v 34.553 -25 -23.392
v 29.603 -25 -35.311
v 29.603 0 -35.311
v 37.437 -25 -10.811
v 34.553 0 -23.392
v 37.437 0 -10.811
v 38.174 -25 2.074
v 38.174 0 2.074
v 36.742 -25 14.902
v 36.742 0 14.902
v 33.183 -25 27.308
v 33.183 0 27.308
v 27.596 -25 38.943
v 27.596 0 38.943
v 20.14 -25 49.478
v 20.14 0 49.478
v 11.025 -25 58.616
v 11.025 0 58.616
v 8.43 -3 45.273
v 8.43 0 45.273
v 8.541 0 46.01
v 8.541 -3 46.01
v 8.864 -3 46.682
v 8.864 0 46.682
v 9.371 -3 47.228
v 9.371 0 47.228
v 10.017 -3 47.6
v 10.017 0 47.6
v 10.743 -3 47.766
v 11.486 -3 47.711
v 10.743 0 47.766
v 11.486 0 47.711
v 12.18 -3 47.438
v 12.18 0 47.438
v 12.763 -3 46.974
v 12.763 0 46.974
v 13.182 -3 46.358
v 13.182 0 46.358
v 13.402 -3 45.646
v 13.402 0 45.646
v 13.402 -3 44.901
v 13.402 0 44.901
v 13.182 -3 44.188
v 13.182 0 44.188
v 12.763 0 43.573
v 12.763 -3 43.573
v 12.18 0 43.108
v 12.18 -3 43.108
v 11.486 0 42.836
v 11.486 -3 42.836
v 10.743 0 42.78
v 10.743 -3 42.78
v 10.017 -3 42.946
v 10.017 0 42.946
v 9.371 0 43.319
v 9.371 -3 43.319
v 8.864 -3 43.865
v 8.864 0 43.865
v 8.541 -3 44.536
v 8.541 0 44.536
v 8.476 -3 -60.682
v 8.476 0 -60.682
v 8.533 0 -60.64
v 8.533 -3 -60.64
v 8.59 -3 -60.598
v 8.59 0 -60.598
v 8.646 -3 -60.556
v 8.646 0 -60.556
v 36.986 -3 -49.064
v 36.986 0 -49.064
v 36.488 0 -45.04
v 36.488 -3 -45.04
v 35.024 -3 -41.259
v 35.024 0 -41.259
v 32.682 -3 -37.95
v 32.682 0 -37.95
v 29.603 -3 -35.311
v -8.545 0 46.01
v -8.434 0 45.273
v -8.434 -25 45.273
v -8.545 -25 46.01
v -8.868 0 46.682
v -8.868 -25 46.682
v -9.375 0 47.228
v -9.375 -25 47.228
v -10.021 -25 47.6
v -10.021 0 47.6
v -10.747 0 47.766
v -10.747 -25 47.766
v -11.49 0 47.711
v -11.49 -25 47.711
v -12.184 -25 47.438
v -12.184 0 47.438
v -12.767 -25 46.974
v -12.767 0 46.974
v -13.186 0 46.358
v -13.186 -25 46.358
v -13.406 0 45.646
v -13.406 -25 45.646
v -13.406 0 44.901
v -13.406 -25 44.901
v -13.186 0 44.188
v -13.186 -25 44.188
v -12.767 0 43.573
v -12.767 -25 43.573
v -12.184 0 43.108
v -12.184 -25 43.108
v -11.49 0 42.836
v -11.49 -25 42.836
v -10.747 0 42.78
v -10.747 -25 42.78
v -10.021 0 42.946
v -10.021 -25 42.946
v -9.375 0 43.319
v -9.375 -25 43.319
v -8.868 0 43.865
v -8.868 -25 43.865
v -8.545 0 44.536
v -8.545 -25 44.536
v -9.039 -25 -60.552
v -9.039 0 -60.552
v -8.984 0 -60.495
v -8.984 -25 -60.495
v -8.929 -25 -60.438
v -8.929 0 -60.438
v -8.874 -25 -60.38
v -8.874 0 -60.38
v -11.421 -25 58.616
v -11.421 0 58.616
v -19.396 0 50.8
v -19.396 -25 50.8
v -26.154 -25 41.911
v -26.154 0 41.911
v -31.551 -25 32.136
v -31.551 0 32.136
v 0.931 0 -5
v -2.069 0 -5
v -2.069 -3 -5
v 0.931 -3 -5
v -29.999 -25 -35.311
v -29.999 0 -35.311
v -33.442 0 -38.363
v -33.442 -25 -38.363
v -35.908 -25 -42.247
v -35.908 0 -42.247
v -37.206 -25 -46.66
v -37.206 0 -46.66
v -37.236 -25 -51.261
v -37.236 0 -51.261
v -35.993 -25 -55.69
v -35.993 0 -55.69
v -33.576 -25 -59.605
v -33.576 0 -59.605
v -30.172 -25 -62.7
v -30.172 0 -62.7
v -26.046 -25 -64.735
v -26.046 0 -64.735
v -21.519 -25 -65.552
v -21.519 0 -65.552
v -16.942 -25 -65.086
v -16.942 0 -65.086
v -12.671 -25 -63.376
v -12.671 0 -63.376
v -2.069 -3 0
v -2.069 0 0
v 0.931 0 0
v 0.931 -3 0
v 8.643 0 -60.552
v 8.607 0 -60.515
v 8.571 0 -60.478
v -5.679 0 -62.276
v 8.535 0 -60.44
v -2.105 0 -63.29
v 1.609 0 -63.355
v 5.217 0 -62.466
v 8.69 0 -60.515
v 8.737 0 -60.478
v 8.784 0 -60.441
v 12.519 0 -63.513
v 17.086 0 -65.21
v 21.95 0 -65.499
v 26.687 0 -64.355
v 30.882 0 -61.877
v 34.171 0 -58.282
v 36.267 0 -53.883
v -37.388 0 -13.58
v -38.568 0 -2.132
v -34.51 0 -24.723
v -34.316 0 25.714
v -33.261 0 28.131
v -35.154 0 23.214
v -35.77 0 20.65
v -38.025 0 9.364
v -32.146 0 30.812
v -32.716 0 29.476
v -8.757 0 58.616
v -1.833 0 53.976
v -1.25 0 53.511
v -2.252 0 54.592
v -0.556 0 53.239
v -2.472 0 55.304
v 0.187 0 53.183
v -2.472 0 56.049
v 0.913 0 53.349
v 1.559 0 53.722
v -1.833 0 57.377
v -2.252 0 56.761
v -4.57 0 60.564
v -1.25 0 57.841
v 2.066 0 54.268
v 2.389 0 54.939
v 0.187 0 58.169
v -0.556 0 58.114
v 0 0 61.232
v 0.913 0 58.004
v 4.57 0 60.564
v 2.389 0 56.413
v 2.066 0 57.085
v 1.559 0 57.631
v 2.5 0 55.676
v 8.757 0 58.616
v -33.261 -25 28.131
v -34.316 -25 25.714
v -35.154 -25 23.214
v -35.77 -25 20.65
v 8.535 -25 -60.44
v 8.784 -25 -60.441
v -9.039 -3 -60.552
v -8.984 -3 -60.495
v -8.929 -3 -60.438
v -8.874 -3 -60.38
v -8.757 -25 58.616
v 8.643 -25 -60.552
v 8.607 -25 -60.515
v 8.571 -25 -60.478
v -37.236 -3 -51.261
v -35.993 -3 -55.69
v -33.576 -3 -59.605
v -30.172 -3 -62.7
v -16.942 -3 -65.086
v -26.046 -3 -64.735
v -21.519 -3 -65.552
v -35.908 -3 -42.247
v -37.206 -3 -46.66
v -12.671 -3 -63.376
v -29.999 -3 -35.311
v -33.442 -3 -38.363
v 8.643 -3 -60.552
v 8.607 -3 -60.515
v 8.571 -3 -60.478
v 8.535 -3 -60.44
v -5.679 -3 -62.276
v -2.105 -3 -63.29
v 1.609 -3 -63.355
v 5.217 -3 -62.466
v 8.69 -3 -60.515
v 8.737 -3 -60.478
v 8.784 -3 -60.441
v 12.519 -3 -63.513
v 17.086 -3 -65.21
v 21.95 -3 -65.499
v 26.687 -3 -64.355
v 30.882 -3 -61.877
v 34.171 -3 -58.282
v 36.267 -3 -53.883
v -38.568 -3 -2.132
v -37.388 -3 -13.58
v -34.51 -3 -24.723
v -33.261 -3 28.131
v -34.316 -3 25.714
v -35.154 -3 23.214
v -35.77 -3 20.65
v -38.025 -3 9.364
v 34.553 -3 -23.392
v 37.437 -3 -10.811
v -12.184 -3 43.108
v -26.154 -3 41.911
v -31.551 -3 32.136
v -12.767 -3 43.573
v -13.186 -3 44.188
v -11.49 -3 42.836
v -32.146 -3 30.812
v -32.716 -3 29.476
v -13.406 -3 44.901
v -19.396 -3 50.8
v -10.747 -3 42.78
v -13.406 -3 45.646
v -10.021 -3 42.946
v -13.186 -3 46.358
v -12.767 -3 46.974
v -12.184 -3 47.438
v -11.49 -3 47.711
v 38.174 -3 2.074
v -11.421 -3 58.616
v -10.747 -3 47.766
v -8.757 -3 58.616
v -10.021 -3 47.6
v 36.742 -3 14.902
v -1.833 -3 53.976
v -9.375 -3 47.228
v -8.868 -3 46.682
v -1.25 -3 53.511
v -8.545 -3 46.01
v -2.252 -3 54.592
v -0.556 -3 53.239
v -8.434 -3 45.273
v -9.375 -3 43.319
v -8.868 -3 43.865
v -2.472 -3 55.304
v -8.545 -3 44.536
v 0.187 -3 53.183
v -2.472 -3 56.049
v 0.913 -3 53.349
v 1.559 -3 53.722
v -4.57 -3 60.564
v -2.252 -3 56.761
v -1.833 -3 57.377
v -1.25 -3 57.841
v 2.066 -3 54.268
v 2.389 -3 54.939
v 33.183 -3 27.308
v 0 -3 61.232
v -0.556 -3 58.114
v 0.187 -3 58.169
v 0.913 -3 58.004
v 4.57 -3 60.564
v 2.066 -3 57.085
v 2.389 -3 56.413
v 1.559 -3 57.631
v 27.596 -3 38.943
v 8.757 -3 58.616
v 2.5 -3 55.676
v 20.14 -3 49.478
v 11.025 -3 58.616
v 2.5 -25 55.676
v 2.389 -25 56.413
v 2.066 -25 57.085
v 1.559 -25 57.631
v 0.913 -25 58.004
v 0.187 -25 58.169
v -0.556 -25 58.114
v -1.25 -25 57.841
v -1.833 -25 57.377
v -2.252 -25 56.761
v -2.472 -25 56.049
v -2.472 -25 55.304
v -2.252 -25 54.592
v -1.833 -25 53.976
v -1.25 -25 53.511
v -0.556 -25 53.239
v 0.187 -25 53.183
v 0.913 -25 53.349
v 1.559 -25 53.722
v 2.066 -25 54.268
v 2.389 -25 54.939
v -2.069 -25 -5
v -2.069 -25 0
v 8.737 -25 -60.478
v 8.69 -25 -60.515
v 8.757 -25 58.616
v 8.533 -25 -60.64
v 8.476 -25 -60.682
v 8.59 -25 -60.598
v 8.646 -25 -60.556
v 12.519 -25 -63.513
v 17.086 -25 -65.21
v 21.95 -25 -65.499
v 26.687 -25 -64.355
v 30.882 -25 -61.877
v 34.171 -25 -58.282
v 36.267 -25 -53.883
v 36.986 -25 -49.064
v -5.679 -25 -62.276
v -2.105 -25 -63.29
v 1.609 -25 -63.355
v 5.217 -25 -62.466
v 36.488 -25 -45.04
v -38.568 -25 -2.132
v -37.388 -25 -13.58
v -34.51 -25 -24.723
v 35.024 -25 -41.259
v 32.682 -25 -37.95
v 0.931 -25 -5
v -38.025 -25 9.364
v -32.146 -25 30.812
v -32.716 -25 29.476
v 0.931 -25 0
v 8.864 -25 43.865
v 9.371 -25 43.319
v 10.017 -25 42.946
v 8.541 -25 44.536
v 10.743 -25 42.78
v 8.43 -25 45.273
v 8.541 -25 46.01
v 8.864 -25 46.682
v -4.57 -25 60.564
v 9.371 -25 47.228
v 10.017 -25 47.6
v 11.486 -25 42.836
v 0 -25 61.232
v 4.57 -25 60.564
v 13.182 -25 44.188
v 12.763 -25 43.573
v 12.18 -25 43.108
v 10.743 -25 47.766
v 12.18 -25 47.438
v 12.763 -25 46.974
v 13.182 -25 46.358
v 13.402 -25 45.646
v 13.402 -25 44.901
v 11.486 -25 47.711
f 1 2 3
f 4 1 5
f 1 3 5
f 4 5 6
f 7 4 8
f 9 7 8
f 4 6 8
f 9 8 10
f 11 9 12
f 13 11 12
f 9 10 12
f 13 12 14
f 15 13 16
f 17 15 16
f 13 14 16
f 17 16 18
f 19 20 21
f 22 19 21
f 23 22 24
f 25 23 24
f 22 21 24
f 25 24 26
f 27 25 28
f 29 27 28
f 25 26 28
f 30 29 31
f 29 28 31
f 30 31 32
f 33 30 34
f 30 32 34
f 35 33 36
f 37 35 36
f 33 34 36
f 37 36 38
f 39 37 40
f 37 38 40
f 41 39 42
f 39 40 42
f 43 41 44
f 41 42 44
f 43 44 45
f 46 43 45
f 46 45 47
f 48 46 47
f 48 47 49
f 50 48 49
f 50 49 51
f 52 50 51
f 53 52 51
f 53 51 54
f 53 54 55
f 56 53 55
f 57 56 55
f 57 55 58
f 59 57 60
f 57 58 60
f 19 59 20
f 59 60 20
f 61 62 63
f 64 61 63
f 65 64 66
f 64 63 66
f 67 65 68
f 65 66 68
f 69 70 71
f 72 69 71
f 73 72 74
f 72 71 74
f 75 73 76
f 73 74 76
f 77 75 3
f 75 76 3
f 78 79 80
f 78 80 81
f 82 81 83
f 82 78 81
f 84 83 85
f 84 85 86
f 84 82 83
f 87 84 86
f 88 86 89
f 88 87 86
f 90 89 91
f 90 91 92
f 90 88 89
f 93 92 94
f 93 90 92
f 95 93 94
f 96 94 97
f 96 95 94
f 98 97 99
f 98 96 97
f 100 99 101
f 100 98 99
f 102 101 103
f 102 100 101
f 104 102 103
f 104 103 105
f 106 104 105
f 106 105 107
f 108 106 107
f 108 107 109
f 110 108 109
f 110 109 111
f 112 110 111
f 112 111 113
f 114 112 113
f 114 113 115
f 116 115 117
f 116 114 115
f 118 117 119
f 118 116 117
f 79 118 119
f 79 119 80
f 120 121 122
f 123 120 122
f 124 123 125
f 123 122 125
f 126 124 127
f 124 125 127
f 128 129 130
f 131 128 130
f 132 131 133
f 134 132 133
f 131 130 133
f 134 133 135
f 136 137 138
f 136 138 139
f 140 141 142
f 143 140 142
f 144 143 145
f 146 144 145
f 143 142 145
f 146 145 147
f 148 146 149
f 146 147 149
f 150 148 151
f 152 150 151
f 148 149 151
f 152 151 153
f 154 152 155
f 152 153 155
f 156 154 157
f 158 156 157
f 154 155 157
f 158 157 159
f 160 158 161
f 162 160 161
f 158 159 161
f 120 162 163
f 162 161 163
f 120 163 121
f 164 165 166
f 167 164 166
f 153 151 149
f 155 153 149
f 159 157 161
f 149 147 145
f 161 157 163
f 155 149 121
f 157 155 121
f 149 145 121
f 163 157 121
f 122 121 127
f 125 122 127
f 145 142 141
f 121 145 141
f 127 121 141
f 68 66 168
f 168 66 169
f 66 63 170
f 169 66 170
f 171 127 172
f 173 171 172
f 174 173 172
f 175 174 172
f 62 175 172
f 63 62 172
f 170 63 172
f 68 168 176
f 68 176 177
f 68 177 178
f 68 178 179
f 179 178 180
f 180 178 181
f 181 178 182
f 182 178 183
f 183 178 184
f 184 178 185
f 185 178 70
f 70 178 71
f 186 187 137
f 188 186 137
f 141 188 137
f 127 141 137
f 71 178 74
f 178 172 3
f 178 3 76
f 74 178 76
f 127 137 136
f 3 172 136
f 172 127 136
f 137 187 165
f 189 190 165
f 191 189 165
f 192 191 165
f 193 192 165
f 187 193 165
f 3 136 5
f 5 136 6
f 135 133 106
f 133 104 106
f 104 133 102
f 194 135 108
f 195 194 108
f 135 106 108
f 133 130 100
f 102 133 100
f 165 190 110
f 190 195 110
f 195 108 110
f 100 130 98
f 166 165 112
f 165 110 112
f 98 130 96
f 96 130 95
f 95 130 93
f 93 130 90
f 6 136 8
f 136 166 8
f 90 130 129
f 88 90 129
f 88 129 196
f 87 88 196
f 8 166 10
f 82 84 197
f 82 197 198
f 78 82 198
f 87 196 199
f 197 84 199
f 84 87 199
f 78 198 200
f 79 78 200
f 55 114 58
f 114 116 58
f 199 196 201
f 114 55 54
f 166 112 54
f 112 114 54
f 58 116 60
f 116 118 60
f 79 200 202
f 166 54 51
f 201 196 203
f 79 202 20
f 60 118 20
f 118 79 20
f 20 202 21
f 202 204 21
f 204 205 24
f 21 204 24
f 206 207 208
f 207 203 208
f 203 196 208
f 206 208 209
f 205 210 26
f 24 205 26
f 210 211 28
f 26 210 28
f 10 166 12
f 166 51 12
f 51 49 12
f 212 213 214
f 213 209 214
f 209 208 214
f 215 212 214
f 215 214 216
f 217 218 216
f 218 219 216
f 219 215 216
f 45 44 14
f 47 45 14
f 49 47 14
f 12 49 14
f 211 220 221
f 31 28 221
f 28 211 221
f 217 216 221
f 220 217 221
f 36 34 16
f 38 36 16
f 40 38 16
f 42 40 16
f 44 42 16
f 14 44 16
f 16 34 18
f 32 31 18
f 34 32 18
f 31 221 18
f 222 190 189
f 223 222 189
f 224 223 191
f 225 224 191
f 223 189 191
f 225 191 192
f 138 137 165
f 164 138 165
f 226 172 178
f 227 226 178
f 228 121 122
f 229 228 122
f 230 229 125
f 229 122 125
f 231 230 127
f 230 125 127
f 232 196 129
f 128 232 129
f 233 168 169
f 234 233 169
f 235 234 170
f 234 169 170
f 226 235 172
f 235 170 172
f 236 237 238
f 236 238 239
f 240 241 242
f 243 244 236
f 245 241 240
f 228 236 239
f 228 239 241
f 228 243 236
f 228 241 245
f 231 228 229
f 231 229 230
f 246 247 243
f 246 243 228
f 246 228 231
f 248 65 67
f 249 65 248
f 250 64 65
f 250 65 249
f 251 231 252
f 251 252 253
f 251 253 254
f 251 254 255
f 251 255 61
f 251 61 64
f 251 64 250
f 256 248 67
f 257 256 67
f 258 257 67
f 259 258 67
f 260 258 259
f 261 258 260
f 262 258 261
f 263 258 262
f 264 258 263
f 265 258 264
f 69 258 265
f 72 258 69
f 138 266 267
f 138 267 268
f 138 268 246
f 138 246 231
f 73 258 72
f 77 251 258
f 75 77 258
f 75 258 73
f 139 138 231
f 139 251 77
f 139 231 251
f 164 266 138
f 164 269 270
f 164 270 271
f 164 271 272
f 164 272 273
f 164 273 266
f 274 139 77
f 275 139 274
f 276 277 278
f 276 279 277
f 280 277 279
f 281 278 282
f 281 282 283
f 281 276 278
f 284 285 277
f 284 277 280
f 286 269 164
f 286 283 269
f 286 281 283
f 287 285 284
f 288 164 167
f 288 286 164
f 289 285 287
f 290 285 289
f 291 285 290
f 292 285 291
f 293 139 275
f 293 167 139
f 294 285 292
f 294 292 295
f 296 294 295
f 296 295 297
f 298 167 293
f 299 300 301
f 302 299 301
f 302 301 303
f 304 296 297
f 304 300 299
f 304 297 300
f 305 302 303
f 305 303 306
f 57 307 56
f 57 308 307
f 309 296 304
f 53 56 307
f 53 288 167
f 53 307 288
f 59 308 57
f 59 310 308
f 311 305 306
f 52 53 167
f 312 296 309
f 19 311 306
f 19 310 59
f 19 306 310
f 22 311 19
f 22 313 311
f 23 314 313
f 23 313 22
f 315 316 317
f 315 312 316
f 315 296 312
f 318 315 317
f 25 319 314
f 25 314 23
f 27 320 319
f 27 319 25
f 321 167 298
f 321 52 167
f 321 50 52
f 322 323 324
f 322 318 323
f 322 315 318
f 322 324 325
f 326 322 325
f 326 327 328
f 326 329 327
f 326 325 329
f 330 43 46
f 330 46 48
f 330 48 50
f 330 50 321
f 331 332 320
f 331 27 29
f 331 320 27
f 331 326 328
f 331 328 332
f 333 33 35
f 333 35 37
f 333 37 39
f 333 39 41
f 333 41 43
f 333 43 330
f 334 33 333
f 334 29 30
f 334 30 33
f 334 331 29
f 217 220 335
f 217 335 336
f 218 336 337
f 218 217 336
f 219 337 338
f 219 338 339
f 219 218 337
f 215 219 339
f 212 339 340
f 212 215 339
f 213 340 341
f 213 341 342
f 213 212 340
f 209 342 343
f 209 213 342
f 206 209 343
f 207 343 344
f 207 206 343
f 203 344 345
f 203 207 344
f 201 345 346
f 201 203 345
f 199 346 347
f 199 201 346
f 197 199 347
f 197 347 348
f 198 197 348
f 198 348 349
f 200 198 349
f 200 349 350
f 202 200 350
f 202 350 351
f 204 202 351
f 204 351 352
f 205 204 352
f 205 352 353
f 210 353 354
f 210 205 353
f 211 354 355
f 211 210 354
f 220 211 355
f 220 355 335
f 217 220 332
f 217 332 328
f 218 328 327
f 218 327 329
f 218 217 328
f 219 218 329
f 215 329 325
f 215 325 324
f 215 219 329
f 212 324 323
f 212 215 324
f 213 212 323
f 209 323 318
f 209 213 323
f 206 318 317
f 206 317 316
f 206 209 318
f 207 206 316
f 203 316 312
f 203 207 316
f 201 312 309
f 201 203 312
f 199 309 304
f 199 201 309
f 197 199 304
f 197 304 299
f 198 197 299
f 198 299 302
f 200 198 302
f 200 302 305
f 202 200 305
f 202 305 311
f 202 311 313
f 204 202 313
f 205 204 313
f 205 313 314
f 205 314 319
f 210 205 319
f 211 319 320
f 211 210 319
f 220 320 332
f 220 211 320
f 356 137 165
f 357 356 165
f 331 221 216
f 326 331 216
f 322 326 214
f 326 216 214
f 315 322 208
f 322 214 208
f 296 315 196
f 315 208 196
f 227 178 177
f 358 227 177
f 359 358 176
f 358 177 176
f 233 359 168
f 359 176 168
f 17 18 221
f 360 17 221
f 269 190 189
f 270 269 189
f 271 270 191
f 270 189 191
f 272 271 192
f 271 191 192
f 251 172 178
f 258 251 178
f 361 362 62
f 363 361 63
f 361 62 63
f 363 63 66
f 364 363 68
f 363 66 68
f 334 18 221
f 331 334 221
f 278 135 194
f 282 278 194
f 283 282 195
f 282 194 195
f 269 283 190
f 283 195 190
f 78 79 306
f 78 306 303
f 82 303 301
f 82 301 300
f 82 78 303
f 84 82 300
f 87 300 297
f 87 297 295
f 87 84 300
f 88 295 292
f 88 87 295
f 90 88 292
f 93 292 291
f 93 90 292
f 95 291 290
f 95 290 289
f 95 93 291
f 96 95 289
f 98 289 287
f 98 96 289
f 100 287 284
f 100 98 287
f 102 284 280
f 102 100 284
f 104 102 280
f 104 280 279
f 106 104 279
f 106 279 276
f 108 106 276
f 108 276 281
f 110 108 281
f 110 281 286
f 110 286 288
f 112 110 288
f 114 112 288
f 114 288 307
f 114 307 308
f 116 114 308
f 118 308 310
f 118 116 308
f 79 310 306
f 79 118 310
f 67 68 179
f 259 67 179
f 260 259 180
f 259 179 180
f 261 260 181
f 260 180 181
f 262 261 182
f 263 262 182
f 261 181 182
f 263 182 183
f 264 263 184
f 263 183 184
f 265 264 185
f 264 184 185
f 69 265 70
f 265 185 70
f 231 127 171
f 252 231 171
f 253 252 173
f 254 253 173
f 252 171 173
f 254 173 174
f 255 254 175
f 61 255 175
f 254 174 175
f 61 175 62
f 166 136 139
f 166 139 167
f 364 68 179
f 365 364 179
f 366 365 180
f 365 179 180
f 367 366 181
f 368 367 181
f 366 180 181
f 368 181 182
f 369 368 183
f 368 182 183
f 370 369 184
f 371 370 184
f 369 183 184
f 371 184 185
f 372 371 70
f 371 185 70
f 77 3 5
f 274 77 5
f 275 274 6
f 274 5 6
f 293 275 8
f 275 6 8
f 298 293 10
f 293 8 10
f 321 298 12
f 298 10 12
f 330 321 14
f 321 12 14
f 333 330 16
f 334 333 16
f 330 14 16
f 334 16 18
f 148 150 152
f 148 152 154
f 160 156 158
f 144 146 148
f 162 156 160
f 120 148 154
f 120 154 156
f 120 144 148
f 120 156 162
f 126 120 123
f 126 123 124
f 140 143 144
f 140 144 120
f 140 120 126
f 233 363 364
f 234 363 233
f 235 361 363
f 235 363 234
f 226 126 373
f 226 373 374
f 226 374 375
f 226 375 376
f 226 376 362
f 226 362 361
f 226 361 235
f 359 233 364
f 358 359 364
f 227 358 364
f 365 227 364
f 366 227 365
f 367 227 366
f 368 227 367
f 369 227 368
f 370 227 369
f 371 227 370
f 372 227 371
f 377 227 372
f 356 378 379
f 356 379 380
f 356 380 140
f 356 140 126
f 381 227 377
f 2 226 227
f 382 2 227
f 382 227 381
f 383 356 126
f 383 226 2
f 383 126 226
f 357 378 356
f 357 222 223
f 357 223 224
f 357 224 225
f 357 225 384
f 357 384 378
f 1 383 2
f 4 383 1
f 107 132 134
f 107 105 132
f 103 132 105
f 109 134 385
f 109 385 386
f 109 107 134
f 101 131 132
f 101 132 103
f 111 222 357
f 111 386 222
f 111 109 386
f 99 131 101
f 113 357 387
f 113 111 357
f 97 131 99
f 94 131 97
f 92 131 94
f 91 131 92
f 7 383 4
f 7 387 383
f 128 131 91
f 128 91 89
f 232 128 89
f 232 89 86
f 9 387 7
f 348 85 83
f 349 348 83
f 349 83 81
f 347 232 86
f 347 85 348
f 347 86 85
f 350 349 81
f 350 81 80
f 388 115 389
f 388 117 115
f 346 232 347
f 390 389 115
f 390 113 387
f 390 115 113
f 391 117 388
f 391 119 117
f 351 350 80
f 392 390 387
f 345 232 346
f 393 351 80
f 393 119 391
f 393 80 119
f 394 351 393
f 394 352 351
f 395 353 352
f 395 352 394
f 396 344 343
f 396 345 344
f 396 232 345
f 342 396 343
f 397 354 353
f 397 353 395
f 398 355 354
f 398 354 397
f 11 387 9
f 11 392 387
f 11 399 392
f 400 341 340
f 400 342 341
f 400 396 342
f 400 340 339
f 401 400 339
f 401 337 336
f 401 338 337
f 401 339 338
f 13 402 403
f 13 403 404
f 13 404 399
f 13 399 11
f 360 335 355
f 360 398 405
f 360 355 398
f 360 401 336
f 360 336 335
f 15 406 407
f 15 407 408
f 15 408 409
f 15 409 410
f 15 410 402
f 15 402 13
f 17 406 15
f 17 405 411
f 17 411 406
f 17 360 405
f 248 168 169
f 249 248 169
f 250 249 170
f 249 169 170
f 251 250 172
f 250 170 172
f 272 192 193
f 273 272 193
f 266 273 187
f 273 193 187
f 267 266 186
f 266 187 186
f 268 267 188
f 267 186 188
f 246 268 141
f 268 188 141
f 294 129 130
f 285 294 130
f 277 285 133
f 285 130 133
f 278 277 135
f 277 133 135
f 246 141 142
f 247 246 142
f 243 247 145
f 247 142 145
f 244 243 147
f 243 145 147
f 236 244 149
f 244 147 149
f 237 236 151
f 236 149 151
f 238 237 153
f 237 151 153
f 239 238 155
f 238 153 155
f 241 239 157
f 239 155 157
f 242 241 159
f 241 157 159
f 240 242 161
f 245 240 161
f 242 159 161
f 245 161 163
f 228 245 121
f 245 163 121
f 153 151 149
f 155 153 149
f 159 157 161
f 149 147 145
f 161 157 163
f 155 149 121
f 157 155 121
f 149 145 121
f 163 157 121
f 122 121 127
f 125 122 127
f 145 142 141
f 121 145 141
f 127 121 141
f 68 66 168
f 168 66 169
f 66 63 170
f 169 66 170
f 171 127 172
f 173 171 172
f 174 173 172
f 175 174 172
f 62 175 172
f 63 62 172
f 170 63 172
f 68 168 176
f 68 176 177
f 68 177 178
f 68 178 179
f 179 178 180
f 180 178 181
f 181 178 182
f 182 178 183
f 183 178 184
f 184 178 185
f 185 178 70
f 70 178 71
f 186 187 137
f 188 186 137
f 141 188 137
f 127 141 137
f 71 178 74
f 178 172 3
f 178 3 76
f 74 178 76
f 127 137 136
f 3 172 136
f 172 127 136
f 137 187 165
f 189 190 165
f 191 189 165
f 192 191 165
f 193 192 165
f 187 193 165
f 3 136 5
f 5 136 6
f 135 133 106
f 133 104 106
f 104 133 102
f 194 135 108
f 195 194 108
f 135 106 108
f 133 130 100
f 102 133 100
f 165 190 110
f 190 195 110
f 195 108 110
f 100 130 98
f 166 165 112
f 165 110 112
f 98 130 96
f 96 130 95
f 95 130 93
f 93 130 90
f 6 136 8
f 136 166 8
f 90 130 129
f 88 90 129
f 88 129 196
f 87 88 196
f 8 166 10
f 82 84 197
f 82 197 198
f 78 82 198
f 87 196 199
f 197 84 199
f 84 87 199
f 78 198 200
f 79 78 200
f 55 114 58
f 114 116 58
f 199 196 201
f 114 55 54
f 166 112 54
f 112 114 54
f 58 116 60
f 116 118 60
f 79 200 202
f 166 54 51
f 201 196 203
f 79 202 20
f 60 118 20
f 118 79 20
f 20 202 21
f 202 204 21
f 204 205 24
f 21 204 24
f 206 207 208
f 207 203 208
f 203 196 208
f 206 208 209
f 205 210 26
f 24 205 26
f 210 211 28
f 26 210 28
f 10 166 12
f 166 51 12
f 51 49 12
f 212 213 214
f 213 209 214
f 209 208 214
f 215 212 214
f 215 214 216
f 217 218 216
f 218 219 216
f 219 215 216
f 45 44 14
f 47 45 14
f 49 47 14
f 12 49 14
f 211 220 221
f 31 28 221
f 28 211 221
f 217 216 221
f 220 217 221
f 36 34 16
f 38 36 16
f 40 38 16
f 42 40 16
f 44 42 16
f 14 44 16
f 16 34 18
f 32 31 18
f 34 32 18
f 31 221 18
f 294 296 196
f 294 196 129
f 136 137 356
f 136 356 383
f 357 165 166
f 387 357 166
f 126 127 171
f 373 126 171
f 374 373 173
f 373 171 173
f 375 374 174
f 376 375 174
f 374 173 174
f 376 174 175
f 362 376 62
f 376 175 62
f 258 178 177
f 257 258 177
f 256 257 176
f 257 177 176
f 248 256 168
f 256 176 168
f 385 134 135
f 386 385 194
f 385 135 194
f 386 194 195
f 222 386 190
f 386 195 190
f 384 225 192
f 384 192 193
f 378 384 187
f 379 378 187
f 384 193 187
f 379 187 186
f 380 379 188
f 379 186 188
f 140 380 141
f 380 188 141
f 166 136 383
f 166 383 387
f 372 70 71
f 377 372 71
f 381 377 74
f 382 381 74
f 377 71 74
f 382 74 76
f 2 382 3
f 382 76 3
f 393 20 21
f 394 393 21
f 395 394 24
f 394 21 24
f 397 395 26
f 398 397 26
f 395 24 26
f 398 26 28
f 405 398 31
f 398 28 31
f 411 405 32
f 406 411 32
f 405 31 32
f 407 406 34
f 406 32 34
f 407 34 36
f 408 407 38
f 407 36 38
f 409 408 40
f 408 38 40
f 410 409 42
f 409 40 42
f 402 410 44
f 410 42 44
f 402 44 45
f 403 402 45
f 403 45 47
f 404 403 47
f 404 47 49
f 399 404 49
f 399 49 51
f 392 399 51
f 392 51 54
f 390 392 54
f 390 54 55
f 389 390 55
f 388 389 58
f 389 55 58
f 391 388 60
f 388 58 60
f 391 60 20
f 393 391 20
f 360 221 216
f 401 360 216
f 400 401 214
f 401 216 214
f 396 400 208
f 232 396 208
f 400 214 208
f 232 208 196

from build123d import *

# Parameters (mm, degrees)
F0_W     = 3
F0_H     = 5
F0_R     = 2.5
F1_DEPTH = 25
F2_DEPTH = 3


with BuildPart() as f1:
    # F0 (on Front) → F1 (new body)
    with BuildSketch(Plane.XZ):
        with BuildLine():
            ThreePointArc((-8.874473618, -60.3803354536), (-0.2500442461, -63.4429120532), (8.4756526138, -60.6820477446))
            ThreePointArc((8.4756526138, -60.6820477446), (8.5592164255, -60.6171314673), (8.6426907154, -60.5521001163))
            ThreePointArc((8.6426907154, -60.5521001163), (8.5889160489, -60.4964001171), (8.5354033323, -60.4404484071))
            ThreePointArc((8.5354033323, -60.4404484071), (7.8420779084, -38.4634470273), (29.6028800387, -35.3111811071))
            ThreePointArc((29.6028800387, -35.3111811071), (36.7424528219, 14.901532493), (11.0251886635, 58.6155168781))
            Line((11.0251886635, 58.6155168781), (8.7567111231, 58.6155168781))
            ThreePointArc((8.7567111231, 58.6155168781), (0, 61.2324429176), (-8.7567111231, 58.6155168781))
            Line((-8.7567111231, 58.6155168781), (-11.4211952728, 58.6155168781))
            ThreePointArc((-11.4211952728, 58.6155168781), (-22.9369072497, 46.4787523973), (-31.5511513118, 32.136246562))
            ThreePointArc((-31.5511513118, 32.136246562), (-32.4343026, 30.1455340285), (-33.2606538291, 28.130580869))
            ThreePointArc((-33.2606538291, 28.130580869), (-34.7625080708, 24.4731163296), (-35.7698018027, 20.6497706274))
            ThreePointArc((-35.7698018027, 20.6497706274), (-38.1928650118, -7.8781409447), (-29.9988866481, -35.3111811071))
            ThreePointArc((-29.9988866481, -35.3111811071), (-13.0776568531, -34.5265825779), (-4.3823958644, -49.0639843047))
            ThreePointArc((-4.3823958644, -49.0639843047), (-5.5464785938, -55.1516473594), (-8.874473618, -60.3803354536))
        make_face()
        with Locations((-0.5688162185, -2.5)):
            Rectangle(F0_W, F0_H, mode=Mode.SUBTRACT)
        with Locations((-10.9338862821, 45.273204802)):
            Circle(F0_R, mode=Mode.SUBTRACT)
        with BuildLine():
            ThreePointArc((13.43, 45.273204802), (10.93, 42.773204802), (8.43, 45.273204802))
            ThreePointArc((8.43, 45.273204802), (10.93, 47.773204802), (13.43, 45.273204802))
        make_face(mode=Mode.SUBTRACT)
        with Locations((0, 55.676382035)):
            Circle(F0_R, mode=Mode.SUBTRACT)
        with BuildLine():
            ThreePointArc((8.6426907154, -60.5521001163), (8.5592164255, -60.6171314673), (8.4756526138, -60.6820477446))
            ThreePointArc((8.4756526138, -60.6820477446), (8.5611519745, -60.6191892874), (8.6461851726, -60.5557016387))
            ThreePointArc((8.6461851726, -60.5557016387), (8.6444378071, -60.5539010104), (8.6426907154, -60.5521001163))
        make_face()
        with BuildLine():
            ThreePointArc((8.7843593079, -60.4413080042), (8.7135574427, -60.4967455294), (8.6426907154, -60.5521001163))
            ThreePointArc((8.6426907154, -60.5521001163), (8.6444378071, -60.5539010104), (8.6461851726, -60.5557016387))
            ThreePointArc((8.6461851726, -60.5557016387), (26.6866566944, -64.3547227983), (36.9863892551, -49.0639843047))
            ThreePointArc((36.9863892551, -49.0639843047), (35.0237909818, -41.2592452934), (29.6028800387, -35.3111811071))
            ThreePointArc((29.6028800387, -35.3111811071), (7.8420779084, -38.4634470273), (8.5354033323, -60.4404484071))
            Line((8.5354033323, -60.4404484071), (8.7843593079, -60.4413080042))
        make_face()
        with BuildLine():
            Line((-9.2597323875, -60.3790052292), (-8.874473618, -60.3803354536))
            ThreePointArc((-8.874473618, -60.3803354536), (-5.5464785938, -55.1516473594), (-4.3823958644, -49.0639843047))
            ThreePointArc((-4.3823958644, -49.0639843047), (-13.0776568531, -34.5265825779), (-29.9988866481, -35.3111811071))
            ThreePointArc((-29.9988866481, -35.3111811071), (-33.5763083284, -59.6050746827), (-9.0386973248, -60.5521001163))
            ThreePointArc((-9.0386973248, -60.5521001163), (-9.1492939508, -60.4656536734), (-9.2597323875, -60.3790052292))
        make_face()
        with BuildLine():
            ThreePointArc((-9.0386973248, -60.5521001163), (-8.9562762396, -60.4665134406), (-8.874473618, -60.3803354536))
            Line((-8.874473618, -60.3803354536), (-9.2597323875, -60.3790052292))
            ThreePointArc((-9.2597323875, -60.3790052292), (-9.1492939508, -60.4656536734), (-9.0386973248, -60.5521001163))
        make_face()
    extrude(amount=F1_DEPTH)


with BuildPart() as f2:
    # F0 (on Front) → F2 (new body)
    with BuildSketch(Plane.XZ):
        with BuildLine():
            ThreePointArc((-8.874473618, -60.3803354536), (-0.2500442461, -63.4429120532), (8.4756526138, -60.6820477446))
            ThreePointArc((8.4756526138, -60.6820477446), (8.5592164255, -60.6171314673), (8.6426907154, -60.5521001163))
            ThreePointArc((8.6426907154, -60.5521001163), (8.5889160489, -60.4964001171), (8.5354033323, -60.4404484071))
            ThreePointArc((8.5354033323, -60.4404484071), (7.8420779084, -38.4634470273), (29.6028800387, -35.3111811071))
            ThreePointArc((29.6028800387, -35.3111811071), (36.7424528219, 14.901532493), (11.0251886635, 58.6155168781))
            Line((11.0251886635, 58.6155168781), (8.7567111231, 58.6155168781))
            ThreePointArc((8.7567111231, 58.6155168781), (0, 61.2324429176), (-8.7567111231, 58.6155168781))
            Line((-8.7567111231, 58.6155168781), (-11.4211952728, 58.6155168781))
            ThreePointArc((-11.4211952728, 58.6155168781), (-22.9369072497, 46.4787523973), (-31.5511513118, 32.136246562))
            ThreePointArc((-31.5511513118, 32.136246562), (-32.4343026, 30.1455340285), (-33.2606538291, 28.130580869))
            ThreePointArc((-33.2606538291, 28.130580869), (-34.7625080708, 24.4731163296), (-35.7698018027, 20.6497706274))
            ThreePointArc((-35.7698018027, 20.6497706274), (-38.1928650118, -7.8781409447), (-29.9988866481, -35.3111811071))
            ThreePointArc((-29.9988866481, -35.3111811071), (-13.0776568531, -34.5265825779), (-4.3823958644, -49.0639843047))
            ThreePointArc((-4.3823958644, -49.0639843047), (-5.5464785938, -55.1516473594), (-8.874473618, -60.3803354536))
        make_face()
        with Locations((-0.5688162185, -2.5)):
            Rectangle(F0_W, F0_H, mode=Mode.SUBTRACT)
        with Locations((-10.9338862821, 45.273204802)):
            Circle(F0_R, mode=Mode.SUBTRACT)
        with BuildLine():
            ThreePointArc((13.43, 45.273204802), (10.93, 42.773204802), (8.43, 45.273204802))
            ThreePointArc((8.43, 45.273204802), (10.93, 47.773204802), (13.43, 45.273204802))
        make_face(mode=Mode.SUBTRACT)
        with Locations((0, 55.676382035)):
            Circle(F0_R, mode=Mode.SUBTRACT)
        with BuildLine():
            ThreePointArc((8.6426907154, -60.5521001163), (8.5592164255, -60.6171314673), (8.4756526138, -60.6820477446))
            ThreePointArc((8.4756526138, -60.6820477446), (8.5611519745, -60.6191892874), (8.6461851726, -60.5557016387))
            ThreePointArc((8.6461851726, -60.5557016387), (8.6444378071, -60.5539010104), (8.6426907154, -60.5521001163))
        make_face()
        with BuildLine():
            ThreePointArc((8.7843593079, -60.4413080042), (8.7135574427, -60.4967455294), (8.6426907154, -60.5521001163))
            ThreePointArc((8.6426907154, -60.5521001163), (8.6444378071, -60.5539010104), (8.6461851726, -60.5557016387))
            ThreePointArc((8.6461851726, -60.5557016387), (26.6866566944, -64.3547227983), (36.9863892551, -49.0639843047))
            ThreePointArc((36.9863892551, -49.0639843047), (35.0237909818, -41.2592452934), (29.6028800387, -35.3111811071))
            ThreePointArc((29.6028800387, -35.3111811071), (7.8420779084, -38.4634470273), (8.5354033323, -60.4404484071))
            Line((8.5354033323, -60.4404484071), (8.7843593079, -60.4413080042))
        make_face()
        with BuildLine():
            Line((-9.2597323875, -60.3790052292), (-8.874473618, -60.3803354536))
            ThreePointArc((-8.874473618, -60.3803354536), (-5.5464785938, -55.1516473594), (-4.3823958644, -49.0639843047))
            ThreePointArc((-4.3823958644, -49.0639843047), (-13.0776568531, -34.5265825779), (-29.9988866481, -35.3111811071))
            ThreePointArc((-29.9988866481, -35.3111811071), (-33.5763083284, -59.6050746827), (-9.0386973248, -60.5521001163))
            ThreePointArc((-9.0386973248, -60.5521001163), (-9.1492939508, -60.4656536734), (-9.2597323875, -60.3790052292))
        make_face()
        with BuildLine():
            ThreePointArc((-9.0386973248, -60.5521001163), (-8.9562762396, -60.4665134406), (-8.874473618, -60.3803354536))
            Line((-8.874473618, -60.3803354536), (-9.2597323875, -60.3790052292))
            ThreePointArc((-9.2597323875, -60.3790052292), (-9.1492939508, -60.4656536734), (-9.0386973248, -60.5521001163))
        make_face()
    extrude(amount=F2_DEPTH)


solid = Compound([f1.part, f2.part])
